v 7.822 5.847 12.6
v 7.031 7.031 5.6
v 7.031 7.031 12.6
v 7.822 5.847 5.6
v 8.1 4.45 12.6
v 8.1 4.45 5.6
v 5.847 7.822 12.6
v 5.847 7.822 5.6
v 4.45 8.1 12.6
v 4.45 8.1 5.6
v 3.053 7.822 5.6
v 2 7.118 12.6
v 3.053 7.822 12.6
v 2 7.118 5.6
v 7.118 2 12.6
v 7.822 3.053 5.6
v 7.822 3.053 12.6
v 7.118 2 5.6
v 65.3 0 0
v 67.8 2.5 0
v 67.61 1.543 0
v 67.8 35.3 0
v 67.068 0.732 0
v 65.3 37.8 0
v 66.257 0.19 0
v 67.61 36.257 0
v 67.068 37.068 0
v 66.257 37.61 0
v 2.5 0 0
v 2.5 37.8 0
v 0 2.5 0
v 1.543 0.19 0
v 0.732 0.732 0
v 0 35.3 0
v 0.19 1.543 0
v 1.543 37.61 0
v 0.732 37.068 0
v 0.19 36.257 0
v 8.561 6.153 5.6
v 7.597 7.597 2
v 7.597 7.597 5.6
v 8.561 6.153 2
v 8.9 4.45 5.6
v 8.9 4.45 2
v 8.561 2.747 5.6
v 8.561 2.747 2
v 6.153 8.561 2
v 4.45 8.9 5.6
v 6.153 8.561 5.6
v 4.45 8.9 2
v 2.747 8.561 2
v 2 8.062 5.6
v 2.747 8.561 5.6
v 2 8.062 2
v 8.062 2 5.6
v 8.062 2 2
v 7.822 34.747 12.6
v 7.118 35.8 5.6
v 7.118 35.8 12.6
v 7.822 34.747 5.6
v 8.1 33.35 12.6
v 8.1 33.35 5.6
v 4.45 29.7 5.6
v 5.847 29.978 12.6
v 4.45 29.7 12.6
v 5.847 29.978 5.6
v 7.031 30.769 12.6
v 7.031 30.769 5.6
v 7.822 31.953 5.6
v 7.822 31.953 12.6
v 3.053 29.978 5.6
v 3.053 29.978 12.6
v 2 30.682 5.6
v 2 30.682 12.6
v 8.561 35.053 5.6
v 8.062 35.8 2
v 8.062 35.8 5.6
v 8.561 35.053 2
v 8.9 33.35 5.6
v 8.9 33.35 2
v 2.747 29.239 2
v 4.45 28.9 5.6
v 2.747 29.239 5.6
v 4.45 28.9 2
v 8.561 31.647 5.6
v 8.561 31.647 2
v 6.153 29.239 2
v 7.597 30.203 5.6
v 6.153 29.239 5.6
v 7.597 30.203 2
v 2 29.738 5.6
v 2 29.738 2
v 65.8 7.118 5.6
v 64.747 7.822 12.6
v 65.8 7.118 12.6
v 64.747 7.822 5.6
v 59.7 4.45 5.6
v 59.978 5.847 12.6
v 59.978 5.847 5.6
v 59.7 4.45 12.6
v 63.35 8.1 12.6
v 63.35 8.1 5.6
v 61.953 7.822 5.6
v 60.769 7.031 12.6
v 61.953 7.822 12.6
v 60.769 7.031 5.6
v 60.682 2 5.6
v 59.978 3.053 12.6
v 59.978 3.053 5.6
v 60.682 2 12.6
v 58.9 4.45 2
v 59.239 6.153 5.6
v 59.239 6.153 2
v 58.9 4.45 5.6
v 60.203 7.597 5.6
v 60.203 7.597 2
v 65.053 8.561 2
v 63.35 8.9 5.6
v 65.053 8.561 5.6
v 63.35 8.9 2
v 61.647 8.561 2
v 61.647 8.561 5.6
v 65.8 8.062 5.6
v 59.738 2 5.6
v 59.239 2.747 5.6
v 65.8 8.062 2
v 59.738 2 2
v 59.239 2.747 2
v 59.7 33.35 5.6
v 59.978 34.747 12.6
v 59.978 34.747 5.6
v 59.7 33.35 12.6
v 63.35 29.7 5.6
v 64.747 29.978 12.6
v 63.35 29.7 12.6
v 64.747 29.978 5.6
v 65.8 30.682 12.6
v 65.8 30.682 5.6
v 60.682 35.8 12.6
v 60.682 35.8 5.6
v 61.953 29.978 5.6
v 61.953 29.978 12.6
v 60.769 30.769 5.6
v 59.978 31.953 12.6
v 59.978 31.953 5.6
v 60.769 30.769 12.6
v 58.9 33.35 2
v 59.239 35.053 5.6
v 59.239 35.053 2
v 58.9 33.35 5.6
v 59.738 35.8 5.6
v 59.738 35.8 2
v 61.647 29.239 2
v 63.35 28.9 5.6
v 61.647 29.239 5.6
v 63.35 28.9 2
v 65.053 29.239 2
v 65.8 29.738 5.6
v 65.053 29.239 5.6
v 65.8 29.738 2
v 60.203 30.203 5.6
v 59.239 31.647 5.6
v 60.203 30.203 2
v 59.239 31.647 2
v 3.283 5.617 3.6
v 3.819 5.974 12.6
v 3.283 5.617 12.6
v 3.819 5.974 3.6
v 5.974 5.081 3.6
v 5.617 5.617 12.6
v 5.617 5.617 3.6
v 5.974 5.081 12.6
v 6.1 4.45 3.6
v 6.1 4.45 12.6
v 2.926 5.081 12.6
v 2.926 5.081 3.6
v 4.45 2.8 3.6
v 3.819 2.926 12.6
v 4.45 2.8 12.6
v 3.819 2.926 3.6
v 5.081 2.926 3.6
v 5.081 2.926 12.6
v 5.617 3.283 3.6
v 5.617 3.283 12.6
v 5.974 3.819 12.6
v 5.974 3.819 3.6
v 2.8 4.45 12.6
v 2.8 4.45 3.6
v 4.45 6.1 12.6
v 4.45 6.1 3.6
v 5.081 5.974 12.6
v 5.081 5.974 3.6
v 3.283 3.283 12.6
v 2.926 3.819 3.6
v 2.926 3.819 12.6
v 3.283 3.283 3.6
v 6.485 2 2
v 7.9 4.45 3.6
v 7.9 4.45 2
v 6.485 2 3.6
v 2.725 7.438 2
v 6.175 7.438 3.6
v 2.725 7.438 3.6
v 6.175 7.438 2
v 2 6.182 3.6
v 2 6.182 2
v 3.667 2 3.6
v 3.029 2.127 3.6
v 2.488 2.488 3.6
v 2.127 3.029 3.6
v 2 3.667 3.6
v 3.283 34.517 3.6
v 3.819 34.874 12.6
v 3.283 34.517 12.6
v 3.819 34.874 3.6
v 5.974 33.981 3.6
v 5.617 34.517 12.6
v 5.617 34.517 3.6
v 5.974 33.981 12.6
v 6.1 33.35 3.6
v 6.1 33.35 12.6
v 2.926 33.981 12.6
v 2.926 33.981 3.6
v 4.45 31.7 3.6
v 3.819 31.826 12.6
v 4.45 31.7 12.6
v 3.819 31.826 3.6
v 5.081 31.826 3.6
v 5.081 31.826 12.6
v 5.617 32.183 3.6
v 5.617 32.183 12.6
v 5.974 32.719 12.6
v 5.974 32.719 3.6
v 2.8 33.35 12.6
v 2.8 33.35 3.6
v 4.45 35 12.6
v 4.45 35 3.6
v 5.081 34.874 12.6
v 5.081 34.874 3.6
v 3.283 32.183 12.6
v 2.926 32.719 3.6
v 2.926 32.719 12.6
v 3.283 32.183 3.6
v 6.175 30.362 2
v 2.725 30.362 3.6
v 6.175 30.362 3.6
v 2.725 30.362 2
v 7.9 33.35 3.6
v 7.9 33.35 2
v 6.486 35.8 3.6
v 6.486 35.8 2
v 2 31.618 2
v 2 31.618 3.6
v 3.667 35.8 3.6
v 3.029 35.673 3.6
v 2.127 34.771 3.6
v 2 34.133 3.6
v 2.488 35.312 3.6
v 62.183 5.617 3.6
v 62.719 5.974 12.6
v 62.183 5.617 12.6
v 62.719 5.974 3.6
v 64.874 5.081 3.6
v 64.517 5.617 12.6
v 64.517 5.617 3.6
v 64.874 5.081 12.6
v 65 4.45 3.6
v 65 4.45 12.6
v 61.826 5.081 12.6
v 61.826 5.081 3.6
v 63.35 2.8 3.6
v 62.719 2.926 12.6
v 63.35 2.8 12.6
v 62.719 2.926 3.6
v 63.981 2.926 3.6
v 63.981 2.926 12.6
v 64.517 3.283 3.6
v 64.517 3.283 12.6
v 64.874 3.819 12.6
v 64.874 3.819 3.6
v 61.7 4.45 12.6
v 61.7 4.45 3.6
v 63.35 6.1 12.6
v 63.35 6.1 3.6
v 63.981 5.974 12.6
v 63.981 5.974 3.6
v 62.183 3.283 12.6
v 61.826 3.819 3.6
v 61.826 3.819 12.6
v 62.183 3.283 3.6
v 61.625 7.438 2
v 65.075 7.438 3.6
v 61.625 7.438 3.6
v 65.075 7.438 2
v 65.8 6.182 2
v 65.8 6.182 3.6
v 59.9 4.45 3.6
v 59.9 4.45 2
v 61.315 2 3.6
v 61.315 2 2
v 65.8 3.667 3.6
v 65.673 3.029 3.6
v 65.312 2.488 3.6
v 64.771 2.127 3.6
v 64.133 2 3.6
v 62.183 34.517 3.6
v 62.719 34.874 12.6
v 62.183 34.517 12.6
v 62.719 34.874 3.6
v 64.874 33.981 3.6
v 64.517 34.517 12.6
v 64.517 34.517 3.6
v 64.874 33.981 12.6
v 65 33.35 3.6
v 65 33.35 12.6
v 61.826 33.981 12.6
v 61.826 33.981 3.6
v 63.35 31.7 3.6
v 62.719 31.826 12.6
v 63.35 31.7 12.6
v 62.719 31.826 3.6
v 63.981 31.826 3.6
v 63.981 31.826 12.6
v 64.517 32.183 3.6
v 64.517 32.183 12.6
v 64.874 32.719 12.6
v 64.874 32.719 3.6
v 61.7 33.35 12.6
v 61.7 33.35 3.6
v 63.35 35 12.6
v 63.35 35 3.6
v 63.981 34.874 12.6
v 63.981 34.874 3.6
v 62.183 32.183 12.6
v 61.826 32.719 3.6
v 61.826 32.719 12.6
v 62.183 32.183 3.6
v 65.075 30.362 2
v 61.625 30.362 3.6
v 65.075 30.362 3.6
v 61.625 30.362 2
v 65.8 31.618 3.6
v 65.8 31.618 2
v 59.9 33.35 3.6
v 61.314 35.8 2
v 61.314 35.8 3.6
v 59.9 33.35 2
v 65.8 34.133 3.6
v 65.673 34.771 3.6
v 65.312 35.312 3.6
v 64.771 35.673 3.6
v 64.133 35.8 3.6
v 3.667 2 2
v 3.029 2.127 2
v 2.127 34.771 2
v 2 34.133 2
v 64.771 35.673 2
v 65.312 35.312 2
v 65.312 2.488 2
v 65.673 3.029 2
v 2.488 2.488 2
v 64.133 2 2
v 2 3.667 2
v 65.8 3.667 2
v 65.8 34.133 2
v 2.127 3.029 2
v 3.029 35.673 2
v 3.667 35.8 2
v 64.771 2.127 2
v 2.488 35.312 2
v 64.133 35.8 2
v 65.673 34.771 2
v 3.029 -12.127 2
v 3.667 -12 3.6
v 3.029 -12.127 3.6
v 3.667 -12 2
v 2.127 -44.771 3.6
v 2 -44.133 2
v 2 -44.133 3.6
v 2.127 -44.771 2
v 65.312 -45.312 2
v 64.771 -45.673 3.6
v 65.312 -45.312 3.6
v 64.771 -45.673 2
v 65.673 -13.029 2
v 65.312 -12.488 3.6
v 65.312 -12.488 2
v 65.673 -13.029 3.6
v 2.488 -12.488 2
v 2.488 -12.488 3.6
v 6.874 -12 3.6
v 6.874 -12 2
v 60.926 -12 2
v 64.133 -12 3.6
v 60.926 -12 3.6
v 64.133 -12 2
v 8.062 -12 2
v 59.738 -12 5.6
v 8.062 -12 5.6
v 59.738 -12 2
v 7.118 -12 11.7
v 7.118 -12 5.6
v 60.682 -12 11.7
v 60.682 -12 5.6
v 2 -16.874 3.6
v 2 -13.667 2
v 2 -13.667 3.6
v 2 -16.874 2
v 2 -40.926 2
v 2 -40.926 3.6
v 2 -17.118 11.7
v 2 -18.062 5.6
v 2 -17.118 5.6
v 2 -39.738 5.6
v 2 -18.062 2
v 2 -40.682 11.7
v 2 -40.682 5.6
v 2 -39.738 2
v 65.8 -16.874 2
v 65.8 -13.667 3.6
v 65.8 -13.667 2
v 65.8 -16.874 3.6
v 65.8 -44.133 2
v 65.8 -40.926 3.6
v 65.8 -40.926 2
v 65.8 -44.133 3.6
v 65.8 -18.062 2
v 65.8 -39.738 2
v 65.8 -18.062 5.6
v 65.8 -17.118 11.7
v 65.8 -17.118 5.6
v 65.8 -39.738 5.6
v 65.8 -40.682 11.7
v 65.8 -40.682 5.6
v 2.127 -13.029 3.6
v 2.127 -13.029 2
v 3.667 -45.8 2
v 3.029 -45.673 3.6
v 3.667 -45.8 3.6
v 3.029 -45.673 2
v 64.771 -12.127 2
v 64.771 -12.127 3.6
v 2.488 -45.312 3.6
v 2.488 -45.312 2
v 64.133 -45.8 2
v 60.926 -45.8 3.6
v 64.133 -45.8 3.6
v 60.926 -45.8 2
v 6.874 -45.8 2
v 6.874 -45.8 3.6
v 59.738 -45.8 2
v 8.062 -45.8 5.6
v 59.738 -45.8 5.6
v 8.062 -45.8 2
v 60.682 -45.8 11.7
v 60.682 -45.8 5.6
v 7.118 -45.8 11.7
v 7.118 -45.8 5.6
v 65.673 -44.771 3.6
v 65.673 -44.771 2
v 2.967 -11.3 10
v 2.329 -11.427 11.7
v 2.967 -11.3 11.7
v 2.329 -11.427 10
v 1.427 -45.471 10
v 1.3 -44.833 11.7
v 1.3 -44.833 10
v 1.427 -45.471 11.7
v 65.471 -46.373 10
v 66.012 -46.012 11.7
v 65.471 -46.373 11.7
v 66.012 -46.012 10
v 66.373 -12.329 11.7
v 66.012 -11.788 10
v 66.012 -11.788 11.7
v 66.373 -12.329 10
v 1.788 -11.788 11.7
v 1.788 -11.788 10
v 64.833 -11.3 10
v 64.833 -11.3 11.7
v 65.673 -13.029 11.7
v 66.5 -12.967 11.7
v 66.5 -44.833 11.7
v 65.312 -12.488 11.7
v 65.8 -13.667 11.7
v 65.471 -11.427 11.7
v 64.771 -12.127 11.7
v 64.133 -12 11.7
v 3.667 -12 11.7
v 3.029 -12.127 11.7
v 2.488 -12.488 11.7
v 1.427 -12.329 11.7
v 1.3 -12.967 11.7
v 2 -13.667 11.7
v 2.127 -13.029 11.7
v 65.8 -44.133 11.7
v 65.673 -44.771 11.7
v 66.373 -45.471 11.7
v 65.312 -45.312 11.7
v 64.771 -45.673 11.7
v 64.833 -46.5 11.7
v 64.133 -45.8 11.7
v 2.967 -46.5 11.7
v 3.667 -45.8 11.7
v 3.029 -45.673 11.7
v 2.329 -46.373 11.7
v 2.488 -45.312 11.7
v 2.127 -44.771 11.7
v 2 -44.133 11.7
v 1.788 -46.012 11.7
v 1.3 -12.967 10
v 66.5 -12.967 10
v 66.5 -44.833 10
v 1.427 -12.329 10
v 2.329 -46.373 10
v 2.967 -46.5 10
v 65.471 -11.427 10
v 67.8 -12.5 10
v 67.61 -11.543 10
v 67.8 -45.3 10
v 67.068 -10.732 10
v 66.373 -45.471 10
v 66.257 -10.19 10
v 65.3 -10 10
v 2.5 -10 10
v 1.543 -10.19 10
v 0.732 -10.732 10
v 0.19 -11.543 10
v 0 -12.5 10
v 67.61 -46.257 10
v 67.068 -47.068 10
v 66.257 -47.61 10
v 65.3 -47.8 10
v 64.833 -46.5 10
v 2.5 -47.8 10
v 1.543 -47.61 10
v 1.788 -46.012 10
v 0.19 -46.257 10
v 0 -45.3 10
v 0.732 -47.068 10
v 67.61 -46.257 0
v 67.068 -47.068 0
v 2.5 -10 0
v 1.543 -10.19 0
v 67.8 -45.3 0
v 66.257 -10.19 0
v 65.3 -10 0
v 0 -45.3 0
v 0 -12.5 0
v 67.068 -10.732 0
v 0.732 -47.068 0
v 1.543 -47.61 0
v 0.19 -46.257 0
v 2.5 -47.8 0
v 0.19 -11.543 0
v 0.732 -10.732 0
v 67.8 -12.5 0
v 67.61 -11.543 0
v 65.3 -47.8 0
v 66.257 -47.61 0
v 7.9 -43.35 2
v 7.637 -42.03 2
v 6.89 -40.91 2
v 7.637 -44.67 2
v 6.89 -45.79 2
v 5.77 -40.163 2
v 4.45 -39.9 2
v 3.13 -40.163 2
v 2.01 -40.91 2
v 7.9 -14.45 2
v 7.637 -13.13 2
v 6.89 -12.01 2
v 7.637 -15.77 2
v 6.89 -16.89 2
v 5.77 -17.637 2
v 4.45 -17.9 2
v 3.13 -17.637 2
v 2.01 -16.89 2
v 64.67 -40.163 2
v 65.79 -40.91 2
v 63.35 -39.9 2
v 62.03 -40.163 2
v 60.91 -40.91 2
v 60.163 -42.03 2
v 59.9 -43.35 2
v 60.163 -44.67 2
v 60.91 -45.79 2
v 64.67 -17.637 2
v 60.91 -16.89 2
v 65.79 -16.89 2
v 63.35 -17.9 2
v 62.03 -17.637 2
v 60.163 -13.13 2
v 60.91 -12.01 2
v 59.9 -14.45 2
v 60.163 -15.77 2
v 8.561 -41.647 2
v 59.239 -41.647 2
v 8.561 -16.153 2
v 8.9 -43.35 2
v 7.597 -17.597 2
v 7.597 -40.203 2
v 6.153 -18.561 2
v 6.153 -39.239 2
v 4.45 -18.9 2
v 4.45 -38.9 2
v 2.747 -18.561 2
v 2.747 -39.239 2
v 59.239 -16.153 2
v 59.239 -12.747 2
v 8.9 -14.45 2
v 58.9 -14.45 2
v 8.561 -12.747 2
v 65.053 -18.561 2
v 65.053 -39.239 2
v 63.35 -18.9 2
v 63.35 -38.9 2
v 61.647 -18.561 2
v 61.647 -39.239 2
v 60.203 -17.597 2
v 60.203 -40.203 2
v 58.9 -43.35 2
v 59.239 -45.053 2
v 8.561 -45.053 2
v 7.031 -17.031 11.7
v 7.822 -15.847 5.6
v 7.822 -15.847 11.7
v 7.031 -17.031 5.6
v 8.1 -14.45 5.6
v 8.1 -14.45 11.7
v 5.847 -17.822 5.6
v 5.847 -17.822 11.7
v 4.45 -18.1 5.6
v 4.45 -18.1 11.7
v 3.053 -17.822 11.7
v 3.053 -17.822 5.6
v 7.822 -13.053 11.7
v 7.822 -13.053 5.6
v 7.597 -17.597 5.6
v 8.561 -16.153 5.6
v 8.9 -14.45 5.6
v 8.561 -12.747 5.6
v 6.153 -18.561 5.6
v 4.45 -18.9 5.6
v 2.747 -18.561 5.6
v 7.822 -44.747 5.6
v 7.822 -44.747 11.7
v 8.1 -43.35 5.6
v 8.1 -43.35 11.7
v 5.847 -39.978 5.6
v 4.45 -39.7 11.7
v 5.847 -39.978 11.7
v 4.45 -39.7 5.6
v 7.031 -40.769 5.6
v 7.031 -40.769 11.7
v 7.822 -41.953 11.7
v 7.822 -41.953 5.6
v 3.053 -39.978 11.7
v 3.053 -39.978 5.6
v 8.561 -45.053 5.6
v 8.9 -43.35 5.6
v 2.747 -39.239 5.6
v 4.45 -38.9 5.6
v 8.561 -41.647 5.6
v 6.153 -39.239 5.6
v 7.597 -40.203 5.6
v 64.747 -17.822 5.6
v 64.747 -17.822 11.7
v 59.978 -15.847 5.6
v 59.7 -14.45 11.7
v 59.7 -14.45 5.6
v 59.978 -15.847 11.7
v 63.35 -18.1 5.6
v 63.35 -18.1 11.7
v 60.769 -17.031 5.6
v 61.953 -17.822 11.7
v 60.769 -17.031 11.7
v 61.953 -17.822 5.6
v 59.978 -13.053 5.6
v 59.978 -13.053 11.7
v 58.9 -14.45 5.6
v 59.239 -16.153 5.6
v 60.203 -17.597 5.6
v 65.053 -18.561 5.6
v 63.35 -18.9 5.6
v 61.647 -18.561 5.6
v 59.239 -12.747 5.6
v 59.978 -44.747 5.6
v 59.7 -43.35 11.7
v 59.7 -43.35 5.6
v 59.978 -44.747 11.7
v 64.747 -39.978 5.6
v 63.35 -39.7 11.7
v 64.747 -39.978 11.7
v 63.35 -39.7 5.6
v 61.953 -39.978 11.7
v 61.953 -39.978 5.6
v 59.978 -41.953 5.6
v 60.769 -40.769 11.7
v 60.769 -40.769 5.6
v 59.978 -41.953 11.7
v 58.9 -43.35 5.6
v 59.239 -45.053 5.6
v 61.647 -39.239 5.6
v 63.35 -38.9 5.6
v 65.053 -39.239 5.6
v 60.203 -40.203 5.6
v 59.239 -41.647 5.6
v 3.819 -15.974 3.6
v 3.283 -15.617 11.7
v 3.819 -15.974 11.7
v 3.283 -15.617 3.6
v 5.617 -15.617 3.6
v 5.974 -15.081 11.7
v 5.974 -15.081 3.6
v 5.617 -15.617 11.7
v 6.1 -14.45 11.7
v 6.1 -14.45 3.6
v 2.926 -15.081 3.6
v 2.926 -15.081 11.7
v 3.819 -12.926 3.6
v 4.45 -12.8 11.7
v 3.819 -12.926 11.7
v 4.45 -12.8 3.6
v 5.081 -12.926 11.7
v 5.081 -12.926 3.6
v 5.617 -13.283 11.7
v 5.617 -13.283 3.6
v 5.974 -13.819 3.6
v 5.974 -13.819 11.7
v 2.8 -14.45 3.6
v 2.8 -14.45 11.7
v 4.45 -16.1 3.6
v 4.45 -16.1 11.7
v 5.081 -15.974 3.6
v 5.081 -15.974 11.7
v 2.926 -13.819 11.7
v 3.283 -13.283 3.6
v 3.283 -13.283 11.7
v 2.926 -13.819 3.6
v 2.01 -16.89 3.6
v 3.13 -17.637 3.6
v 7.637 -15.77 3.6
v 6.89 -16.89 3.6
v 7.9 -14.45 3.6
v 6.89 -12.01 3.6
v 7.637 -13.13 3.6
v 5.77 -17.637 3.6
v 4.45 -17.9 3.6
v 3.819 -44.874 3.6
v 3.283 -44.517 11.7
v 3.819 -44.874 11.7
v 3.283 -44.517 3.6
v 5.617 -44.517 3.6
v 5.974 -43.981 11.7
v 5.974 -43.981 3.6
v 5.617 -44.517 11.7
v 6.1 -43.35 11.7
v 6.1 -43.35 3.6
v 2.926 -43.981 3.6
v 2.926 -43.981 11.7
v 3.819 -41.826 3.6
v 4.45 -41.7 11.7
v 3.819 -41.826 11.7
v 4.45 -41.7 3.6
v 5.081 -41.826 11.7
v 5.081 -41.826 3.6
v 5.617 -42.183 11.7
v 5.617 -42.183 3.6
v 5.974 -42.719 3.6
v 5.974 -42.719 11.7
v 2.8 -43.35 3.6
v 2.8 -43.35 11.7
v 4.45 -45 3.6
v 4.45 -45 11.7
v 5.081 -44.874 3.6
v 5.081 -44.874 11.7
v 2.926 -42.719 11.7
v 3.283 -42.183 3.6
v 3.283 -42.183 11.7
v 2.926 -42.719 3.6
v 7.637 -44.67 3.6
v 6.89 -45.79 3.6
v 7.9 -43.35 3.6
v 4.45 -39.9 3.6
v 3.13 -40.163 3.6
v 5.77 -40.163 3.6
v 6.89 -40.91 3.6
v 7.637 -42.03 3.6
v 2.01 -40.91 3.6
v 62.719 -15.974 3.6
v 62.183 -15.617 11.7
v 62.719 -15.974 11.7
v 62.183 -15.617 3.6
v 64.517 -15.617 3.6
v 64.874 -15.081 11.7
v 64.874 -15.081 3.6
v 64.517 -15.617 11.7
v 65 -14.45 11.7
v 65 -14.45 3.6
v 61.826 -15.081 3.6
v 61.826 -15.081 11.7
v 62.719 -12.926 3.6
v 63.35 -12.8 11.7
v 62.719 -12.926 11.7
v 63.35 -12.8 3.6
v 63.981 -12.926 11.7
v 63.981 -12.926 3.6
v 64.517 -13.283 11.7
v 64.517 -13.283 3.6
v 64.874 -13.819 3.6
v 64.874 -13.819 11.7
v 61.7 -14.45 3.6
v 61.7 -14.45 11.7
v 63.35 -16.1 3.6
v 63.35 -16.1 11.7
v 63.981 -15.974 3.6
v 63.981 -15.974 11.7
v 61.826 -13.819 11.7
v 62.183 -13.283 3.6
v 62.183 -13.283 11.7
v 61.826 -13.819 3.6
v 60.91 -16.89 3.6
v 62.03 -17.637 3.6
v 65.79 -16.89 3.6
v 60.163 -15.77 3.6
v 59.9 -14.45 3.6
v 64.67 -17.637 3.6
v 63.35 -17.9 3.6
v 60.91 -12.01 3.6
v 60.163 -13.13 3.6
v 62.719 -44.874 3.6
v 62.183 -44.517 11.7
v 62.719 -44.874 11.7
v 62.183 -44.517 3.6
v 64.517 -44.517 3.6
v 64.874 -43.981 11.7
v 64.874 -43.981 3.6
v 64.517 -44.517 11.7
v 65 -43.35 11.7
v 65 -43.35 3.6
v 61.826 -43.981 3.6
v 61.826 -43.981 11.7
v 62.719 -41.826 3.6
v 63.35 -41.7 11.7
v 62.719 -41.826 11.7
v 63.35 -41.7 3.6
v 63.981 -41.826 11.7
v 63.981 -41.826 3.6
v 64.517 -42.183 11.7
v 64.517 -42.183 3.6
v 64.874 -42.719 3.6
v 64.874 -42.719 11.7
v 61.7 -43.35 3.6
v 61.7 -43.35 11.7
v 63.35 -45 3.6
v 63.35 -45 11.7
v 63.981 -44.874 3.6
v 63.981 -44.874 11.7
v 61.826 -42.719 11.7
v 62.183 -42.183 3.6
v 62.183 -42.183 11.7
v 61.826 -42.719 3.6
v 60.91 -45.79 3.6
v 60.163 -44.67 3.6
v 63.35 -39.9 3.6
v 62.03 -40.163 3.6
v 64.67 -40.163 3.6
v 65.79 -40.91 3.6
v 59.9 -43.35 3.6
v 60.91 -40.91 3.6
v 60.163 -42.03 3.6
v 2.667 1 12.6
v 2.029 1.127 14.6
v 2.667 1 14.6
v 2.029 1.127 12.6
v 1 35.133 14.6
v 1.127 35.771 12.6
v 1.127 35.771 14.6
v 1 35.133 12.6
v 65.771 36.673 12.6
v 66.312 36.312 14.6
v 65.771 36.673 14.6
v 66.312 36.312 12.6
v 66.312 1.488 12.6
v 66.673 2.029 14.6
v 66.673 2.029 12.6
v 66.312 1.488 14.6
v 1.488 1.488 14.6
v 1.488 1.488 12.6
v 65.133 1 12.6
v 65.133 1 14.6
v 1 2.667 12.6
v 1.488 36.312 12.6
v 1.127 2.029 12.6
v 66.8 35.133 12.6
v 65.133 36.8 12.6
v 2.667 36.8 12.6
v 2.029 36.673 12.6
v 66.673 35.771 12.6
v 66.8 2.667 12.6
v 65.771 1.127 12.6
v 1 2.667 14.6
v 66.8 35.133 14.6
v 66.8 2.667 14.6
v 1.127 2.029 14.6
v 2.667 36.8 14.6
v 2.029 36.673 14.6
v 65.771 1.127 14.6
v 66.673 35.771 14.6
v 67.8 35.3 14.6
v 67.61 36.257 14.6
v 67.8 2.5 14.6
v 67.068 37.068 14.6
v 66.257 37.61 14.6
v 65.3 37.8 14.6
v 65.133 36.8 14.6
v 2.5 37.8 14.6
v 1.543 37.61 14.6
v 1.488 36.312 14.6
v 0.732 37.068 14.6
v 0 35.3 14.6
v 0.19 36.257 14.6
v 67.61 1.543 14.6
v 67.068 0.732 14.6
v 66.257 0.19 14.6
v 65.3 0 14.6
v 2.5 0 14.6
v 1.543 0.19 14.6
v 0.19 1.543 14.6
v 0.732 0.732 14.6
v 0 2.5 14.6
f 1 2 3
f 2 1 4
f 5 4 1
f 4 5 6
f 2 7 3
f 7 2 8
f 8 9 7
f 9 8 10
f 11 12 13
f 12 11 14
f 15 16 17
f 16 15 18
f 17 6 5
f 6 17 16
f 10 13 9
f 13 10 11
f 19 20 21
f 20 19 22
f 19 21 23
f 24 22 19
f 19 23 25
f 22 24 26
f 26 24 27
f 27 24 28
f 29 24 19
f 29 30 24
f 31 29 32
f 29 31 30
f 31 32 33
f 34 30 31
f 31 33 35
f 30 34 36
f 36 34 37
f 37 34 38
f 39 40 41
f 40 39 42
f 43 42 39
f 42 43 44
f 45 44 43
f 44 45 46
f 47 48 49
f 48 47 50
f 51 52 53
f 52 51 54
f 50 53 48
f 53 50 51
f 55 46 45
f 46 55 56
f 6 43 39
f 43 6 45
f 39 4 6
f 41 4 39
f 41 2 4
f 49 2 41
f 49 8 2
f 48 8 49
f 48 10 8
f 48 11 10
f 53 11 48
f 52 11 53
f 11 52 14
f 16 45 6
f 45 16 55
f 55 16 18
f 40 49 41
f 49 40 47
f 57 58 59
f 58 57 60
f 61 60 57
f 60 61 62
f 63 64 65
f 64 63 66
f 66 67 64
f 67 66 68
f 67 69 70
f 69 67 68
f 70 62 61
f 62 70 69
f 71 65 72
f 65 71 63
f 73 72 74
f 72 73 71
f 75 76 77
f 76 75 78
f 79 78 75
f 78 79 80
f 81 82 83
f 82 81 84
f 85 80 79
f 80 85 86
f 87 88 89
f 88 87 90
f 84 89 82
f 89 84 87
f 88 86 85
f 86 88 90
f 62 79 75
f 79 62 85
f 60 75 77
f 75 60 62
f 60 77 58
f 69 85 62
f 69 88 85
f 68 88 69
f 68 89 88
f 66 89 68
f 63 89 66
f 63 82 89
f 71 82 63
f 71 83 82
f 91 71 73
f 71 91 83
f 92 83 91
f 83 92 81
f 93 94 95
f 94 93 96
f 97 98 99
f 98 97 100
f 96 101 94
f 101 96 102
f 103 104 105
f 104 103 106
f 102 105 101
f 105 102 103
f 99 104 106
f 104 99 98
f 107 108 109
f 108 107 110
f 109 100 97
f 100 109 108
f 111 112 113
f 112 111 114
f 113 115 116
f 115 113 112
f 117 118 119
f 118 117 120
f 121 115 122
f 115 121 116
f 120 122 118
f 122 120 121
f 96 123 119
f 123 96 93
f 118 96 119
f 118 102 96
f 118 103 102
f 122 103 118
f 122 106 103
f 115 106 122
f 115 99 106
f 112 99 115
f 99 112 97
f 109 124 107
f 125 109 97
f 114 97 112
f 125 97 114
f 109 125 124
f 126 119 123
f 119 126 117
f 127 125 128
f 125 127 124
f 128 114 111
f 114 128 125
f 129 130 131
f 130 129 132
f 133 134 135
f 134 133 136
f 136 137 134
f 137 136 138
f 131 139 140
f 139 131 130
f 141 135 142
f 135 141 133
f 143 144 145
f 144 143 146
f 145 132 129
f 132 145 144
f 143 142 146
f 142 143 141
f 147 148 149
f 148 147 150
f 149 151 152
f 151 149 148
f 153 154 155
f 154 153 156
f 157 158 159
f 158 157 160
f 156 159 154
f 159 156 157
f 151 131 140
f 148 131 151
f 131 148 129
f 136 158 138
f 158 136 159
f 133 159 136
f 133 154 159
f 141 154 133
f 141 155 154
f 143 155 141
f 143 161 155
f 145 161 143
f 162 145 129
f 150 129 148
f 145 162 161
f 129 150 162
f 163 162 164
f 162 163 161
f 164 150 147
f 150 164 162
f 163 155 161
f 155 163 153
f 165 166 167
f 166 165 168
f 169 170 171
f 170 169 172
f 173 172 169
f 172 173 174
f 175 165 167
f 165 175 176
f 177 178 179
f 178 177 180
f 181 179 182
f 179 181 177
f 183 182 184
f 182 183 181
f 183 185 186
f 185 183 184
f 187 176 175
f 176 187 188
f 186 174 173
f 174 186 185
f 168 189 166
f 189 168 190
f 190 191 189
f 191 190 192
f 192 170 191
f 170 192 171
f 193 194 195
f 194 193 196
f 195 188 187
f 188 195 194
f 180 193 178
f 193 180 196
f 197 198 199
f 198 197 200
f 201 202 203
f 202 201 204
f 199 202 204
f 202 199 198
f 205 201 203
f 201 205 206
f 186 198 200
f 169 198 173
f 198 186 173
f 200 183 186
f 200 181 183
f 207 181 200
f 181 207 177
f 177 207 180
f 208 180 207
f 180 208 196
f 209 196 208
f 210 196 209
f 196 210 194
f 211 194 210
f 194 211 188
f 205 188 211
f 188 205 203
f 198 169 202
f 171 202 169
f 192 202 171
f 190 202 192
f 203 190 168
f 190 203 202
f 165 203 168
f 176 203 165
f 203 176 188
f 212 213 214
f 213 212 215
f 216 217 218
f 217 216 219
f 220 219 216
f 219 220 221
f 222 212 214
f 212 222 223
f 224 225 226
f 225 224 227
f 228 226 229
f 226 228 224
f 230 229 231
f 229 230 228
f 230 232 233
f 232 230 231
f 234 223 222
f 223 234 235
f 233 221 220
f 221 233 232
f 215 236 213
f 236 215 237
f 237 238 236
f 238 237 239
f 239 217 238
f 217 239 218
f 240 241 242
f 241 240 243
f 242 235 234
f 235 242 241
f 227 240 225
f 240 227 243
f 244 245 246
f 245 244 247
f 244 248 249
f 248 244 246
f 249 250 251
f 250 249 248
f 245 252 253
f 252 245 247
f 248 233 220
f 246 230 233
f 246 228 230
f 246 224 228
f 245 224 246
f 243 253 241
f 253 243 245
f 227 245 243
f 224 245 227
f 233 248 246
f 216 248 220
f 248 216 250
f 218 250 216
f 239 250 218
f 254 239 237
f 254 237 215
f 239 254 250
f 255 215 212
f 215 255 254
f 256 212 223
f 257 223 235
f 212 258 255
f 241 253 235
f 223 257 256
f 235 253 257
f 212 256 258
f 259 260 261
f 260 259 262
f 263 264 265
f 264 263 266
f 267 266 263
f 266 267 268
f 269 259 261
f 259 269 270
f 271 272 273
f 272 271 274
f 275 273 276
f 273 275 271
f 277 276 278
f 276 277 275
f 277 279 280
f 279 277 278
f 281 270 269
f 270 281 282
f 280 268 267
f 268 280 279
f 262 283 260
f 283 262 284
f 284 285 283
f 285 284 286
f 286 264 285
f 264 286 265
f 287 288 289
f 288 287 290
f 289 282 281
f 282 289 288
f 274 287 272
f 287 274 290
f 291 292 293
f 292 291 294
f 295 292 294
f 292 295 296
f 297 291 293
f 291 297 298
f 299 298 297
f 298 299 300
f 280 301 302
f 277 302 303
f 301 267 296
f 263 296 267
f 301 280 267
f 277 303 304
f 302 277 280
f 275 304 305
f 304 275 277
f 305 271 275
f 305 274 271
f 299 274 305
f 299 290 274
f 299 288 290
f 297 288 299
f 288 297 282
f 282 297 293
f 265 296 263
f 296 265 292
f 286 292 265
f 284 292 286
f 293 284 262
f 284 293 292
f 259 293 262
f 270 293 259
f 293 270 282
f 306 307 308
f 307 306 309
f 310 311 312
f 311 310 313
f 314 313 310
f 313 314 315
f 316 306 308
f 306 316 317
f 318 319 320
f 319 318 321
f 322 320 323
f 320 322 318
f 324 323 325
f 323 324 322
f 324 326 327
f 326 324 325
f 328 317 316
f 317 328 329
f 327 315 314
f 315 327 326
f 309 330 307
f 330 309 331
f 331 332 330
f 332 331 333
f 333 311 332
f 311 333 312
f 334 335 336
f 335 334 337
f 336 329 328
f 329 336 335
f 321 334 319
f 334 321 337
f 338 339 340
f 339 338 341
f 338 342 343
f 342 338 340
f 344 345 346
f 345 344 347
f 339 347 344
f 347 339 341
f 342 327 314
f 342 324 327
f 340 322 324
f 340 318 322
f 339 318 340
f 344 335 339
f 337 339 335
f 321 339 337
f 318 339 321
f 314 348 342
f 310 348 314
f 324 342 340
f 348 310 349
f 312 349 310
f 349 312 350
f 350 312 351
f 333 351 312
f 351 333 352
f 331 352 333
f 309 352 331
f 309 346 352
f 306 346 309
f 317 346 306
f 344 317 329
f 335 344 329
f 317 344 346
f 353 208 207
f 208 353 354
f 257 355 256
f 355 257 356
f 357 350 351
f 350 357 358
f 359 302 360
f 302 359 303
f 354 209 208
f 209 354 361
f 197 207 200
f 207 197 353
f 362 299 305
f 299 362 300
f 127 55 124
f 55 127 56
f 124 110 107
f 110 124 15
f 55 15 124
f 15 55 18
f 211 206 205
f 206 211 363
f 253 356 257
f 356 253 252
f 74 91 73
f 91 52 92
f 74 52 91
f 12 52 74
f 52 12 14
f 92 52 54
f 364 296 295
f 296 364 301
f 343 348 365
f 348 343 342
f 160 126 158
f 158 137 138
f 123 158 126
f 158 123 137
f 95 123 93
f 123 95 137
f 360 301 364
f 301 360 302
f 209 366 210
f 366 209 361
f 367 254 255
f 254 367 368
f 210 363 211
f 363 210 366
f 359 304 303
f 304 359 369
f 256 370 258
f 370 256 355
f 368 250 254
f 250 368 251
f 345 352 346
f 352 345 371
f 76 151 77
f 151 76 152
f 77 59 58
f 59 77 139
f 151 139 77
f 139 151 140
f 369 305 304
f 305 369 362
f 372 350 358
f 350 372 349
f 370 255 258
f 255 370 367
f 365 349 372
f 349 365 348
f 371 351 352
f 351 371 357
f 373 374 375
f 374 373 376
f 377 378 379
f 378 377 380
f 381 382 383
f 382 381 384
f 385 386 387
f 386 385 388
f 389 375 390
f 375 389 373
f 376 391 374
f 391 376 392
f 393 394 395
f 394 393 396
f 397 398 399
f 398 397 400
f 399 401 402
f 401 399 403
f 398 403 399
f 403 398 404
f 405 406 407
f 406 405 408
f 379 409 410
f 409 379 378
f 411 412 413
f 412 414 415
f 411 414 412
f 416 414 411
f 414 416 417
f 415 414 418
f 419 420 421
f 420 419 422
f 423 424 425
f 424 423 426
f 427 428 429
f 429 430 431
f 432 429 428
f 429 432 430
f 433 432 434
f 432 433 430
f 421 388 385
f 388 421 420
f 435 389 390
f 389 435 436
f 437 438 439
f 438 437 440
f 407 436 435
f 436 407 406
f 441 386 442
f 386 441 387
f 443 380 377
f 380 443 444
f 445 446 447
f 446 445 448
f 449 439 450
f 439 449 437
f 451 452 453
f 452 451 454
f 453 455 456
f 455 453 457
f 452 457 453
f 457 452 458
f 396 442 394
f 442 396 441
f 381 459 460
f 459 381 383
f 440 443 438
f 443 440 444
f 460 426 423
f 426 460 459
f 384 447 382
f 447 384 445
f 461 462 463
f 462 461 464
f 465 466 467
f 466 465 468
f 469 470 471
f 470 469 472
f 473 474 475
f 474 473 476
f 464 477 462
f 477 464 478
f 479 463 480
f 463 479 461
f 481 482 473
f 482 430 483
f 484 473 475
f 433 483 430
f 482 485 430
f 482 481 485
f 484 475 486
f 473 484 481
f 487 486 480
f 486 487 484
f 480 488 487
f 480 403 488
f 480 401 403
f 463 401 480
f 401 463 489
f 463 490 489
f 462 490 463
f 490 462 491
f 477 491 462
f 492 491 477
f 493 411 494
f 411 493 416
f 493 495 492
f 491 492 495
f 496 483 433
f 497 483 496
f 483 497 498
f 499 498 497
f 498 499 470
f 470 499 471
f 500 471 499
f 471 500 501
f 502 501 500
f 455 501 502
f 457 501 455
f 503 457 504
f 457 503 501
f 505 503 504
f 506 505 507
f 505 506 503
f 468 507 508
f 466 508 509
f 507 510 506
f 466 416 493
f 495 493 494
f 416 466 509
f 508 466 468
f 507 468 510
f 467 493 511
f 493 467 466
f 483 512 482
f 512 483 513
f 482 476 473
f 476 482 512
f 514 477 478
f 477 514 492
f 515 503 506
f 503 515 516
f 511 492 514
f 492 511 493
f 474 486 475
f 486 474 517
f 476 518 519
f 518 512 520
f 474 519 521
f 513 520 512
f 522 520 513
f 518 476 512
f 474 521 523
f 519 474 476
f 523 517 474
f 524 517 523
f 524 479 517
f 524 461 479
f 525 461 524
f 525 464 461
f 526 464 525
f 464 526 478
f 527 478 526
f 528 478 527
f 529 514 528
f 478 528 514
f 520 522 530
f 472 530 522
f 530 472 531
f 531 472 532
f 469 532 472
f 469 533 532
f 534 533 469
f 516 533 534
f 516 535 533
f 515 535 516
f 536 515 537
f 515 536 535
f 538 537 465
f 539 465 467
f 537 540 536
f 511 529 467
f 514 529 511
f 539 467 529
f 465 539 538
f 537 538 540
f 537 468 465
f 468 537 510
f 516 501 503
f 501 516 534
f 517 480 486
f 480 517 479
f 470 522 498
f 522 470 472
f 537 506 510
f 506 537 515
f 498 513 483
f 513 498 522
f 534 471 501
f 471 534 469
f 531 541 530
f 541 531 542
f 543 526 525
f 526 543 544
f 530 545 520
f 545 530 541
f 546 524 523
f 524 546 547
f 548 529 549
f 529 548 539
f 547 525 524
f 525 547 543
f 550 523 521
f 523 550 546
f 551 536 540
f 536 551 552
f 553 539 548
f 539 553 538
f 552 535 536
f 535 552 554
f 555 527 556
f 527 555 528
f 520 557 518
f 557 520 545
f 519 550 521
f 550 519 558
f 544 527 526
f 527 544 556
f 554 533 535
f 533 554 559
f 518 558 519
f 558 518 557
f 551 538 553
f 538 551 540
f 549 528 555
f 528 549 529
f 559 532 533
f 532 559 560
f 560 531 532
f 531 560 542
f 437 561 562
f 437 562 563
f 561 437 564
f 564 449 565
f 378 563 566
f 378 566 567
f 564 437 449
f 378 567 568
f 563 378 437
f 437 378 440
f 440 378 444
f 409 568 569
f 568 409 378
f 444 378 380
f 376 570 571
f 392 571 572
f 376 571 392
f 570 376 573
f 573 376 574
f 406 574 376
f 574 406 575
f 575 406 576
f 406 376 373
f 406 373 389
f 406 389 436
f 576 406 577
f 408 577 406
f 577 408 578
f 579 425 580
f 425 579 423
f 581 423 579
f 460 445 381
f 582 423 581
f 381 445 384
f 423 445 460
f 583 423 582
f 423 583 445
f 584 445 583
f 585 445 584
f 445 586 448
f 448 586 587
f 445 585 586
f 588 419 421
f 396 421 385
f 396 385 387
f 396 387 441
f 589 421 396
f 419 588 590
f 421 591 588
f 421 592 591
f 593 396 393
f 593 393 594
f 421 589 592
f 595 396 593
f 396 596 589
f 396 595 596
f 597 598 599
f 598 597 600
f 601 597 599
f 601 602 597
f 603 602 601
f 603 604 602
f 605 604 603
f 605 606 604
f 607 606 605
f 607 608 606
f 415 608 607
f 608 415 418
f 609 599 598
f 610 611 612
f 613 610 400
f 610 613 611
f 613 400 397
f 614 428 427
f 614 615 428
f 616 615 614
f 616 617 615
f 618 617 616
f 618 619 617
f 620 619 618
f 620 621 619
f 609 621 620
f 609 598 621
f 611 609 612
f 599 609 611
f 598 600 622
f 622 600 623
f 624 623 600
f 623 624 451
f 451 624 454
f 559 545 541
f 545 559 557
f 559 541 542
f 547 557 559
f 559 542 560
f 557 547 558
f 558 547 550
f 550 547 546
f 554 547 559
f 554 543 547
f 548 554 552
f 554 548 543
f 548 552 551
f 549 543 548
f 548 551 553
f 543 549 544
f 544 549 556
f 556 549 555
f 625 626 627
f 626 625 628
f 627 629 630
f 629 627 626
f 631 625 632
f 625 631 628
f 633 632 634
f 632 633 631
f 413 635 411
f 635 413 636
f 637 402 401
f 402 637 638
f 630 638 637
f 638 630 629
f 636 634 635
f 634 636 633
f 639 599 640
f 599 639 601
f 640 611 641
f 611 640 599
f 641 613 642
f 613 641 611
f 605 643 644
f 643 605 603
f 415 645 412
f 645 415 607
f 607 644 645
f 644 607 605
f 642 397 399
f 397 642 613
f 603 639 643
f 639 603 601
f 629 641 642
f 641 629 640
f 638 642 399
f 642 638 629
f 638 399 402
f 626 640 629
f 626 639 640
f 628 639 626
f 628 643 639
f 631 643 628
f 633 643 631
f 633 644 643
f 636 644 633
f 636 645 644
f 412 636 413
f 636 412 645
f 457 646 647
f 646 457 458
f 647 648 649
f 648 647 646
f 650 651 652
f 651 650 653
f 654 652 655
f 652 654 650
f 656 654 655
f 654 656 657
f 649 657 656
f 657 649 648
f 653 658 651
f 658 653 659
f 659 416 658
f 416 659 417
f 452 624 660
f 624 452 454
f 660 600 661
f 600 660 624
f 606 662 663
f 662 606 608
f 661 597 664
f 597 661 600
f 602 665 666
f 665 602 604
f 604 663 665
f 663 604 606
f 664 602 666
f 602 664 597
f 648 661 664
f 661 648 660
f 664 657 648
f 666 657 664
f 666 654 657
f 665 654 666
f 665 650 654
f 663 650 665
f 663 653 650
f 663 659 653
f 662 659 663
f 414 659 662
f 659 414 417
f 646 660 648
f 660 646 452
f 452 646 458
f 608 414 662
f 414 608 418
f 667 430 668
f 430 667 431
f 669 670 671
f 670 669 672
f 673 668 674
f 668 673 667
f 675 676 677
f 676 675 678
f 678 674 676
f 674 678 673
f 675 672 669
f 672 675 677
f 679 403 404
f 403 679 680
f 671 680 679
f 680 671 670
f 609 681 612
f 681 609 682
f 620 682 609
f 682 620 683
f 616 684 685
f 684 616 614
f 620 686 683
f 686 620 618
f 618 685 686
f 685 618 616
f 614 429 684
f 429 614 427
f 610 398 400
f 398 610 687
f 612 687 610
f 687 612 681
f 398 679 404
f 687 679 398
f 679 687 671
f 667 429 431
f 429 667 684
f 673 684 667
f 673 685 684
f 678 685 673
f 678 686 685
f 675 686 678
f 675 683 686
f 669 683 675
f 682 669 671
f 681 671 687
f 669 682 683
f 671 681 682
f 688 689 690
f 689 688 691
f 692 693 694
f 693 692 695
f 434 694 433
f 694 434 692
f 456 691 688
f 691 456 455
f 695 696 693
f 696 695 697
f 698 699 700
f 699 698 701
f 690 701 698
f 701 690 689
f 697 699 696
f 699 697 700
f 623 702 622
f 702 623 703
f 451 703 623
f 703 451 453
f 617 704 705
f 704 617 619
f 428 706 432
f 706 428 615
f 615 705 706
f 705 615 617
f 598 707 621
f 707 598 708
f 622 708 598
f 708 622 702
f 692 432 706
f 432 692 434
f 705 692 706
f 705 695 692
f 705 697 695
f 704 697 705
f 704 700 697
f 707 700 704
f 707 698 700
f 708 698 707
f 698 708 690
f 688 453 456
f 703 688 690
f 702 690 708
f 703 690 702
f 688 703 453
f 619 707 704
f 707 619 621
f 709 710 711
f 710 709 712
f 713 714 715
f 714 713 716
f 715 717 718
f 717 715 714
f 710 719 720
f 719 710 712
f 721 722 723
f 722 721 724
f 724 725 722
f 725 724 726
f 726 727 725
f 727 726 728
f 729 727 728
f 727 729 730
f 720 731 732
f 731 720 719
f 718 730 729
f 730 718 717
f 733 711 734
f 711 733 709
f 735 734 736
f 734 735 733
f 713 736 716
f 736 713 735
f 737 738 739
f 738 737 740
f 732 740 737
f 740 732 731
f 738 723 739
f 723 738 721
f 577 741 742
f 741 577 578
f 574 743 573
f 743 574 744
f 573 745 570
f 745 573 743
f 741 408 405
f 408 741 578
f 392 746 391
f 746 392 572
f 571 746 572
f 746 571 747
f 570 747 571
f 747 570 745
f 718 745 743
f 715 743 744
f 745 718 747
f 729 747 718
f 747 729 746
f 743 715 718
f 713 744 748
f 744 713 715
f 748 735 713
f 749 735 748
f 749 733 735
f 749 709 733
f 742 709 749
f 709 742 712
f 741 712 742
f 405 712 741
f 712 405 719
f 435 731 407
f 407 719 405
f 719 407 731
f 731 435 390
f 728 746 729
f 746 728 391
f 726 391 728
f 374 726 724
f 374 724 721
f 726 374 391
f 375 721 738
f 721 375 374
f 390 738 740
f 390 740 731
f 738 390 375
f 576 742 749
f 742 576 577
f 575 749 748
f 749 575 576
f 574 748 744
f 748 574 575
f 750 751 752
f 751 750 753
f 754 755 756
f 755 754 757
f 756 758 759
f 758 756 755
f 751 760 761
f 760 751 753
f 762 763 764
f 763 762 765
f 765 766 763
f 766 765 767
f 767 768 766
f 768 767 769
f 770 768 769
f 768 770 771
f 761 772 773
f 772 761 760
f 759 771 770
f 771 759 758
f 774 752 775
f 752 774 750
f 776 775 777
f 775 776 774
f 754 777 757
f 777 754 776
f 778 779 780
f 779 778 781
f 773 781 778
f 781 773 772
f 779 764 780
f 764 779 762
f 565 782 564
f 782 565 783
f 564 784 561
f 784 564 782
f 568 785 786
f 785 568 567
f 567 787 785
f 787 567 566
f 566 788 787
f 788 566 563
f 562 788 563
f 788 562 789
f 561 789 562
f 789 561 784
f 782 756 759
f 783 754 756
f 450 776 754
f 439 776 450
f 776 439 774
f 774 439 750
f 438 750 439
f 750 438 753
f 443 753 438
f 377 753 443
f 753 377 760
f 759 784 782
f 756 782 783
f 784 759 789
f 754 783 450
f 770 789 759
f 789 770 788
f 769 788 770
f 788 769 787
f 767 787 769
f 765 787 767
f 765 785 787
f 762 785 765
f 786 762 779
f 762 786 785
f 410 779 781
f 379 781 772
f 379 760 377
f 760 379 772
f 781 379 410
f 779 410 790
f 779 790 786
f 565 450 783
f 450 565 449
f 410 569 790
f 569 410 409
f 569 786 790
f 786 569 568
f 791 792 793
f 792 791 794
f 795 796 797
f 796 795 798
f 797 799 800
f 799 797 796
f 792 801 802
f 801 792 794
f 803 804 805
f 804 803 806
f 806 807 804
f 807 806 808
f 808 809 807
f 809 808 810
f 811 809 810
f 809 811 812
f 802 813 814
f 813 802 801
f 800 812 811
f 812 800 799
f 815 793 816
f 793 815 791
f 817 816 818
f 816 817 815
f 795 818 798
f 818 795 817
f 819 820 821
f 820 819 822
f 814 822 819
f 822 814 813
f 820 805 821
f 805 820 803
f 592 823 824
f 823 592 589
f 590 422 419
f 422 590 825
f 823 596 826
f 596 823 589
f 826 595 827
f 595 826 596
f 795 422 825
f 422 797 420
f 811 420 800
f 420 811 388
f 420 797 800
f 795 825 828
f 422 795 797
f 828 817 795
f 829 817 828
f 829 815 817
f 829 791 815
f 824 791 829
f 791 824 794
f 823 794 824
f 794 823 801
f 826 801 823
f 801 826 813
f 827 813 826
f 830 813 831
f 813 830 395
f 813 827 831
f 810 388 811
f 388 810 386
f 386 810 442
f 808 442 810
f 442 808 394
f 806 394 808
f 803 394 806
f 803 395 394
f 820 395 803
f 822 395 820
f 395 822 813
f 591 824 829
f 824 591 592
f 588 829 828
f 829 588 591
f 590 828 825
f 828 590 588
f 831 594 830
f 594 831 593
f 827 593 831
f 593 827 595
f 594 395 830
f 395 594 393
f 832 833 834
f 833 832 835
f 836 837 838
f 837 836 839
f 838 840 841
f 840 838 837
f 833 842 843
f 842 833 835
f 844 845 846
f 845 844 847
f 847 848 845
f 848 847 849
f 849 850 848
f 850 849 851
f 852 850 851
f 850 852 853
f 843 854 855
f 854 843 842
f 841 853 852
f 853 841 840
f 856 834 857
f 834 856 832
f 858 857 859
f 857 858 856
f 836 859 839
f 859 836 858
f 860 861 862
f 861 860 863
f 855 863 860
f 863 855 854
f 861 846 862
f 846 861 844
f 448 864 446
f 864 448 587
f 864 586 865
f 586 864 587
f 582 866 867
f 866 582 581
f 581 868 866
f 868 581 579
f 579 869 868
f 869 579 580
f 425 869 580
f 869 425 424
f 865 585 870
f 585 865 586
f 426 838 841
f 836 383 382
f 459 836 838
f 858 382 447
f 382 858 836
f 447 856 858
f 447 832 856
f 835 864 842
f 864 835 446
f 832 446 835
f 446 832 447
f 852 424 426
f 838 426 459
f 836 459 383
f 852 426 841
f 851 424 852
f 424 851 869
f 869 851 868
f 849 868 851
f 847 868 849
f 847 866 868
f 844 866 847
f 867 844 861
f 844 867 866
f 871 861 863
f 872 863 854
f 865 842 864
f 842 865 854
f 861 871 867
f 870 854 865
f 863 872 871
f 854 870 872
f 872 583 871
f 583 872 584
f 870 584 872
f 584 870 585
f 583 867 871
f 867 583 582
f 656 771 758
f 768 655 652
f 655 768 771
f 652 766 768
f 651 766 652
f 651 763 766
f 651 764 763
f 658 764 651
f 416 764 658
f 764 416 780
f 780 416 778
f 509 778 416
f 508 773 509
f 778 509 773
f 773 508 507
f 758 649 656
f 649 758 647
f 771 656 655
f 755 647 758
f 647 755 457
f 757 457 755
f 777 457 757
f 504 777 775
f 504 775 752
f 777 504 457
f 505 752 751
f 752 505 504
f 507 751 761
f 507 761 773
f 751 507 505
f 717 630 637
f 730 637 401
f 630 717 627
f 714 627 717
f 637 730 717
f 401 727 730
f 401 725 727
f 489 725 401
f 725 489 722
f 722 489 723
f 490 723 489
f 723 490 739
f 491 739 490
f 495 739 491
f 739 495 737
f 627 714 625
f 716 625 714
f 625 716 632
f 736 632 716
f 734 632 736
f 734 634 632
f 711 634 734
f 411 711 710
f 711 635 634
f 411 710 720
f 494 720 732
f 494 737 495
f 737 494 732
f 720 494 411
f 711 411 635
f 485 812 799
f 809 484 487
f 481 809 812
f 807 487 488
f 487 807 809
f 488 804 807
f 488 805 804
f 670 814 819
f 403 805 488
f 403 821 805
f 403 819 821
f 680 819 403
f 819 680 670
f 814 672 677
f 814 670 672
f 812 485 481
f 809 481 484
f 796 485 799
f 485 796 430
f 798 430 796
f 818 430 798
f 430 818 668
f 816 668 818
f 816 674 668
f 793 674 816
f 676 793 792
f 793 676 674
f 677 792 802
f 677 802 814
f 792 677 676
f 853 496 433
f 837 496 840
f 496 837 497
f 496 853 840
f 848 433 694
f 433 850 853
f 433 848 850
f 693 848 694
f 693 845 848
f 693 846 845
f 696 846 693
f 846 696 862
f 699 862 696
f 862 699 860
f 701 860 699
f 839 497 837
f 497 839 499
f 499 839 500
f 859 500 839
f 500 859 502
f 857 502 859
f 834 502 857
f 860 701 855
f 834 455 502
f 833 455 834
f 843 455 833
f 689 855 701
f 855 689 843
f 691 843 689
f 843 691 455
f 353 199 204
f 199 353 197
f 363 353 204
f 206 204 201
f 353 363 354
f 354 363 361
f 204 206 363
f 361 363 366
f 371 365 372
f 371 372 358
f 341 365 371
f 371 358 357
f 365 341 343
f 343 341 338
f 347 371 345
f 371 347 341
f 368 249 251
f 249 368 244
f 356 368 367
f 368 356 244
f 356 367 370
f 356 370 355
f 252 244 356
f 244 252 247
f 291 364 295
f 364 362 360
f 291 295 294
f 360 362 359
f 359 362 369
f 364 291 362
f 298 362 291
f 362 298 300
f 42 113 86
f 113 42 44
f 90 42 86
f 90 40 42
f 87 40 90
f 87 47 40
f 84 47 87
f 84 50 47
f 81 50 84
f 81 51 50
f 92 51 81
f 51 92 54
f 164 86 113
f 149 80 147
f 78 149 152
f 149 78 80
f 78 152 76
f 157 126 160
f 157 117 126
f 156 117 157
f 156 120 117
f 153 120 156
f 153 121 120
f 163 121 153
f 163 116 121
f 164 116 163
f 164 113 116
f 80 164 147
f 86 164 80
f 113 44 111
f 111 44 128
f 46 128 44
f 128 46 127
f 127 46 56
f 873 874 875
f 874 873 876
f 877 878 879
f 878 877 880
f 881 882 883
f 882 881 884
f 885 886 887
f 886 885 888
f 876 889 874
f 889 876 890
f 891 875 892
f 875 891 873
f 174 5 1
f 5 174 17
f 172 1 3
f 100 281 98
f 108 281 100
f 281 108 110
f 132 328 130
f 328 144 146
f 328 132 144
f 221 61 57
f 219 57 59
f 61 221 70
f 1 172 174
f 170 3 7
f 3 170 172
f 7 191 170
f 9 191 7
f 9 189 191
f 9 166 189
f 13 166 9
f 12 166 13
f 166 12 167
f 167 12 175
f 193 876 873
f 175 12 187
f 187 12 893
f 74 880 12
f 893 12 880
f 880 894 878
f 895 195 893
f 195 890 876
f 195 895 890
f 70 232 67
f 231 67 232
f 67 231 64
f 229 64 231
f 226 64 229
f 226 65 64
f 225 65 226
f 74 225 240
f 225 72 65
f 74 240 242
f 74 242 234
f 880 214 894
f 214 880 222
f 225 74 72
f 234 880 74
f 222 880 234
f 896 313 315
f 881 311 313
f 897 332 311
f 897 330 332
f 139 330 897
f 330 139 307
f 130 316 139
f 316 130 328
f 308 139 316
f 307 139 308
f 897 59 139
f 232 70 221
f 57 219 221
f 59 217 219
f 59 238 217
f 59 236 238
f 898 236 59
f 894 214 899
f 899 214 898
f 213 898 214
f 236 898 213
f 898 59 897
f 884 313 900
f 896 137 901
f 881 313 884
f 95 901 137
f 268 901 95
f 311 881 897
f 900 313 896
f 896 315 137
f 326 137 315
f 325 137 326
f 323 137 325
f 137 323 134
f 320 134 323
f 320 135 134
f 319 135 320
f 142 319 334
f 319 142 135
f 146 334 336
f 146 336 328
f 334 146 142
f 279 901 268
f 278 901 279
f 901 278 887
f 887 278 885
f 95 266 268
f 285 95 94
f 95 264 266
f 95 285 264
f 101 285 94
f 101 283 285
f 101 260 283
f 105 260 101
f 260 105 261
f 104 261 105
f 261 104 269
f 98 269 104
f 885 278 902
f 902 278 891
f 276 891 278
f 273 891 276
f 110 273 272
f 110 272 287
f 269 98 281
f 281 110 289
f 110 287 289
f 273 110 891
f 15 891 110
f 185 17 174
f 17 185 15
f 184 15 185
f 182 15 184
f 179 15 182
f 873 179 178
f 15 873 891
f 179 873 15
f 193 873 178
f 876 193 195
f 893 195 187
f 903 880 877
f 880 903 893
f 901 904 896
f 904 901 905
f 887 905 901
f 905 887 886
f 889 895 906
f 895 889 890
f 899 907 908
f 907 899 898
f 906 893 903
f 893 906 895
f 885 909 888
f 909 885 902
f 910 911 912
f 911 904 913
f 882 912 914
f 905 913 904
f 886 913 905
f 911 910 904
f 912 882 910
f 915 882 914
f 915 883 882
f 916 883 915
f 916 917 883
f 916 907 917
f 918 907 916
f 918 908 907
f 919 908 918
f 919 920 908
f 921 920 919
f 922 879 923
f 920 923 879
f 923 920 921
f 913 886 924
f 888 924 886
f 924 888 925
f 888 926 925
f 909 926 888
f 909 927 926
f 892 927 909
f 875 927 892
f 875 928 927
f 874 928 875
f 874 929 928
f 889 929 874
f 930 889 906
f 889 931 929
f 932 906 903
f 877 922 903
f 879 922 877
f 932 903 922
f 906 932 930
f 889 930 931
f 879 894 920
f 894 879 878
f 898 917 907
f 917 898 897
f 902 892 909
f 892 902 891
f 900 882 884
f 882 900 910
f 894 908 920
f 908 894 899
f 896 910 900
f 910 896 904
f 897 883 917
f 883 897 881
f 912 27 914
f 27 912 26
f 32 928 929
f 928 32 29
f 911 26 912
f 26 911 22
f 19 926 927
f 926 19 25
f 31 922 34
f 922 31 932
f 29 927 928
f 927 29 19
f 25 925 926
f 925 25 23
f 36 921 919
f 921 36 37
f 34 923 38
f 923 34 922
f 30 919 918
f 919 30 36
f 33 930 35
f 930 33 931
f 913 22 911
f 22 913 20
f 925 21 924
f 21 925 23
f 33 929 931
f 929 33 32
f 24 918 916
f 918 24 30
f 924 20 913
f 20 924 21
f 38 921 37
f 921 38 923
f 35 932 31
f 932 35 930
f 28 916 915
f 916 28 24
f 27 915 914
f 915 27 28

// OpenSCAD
// file: cube_round.scad
module cube_round(dim,mki=5,plane="xy"){
    if(mki<=0)
    {
        cube(dim);
    }
    else
    {
        if(plane=="xy")
        {
            translate([mki/2,mki/2,0])
            {
                linear_extrude(dim[2])
                {
                    minkowski()
                    {
                        square([dim[0]-mki,dim[1]-mki]);
                        circle(d=mki);
                    }
                }
            }
        }
        if(plane=="yz")
        {
            translate([0,mki/2,dim[2]-mki/2])
            {
                rotate([0,90,0])
                {
                    linear_extrude(dim[0])
                    {
                        minkowski()
                        {
                            square([dim[2]-mki,dim[1]-mki]);
                            circle(d=mki);
                        }
                    }
                }
            }
        }
        if(plane=="xz")
        {
            translate([mki/2,dim[1],mki/2])
            {
                rotate([90,0,0])
                {
                    linear_extrude(dim[1])
                    {
                        minkowski()
                        {
                            square([dim[0]-mki,dim[2]-mki]);
                            circle(d=mki);
                        }
                    }
                }
            }
        }
    }
}

cube_round([10,20,30],4,"xy");
// main file
$fn=16;
use <cube_round.scad>;

case(render="all");

module case(render="all",
            dim_inside=[50,20,20],
            dia_screws=3.3,
            wall=2,
            height_top=10,
            gap=0.3,
            mki=5)
{
    dia_screw_head=2*dia_screws+gap;
    height_screw_head=dia_screws+gap;
    off_screw=dia_screw_head/2+wall/2;
    
    off_inside=dia_screw_head+wall;
    mki_inside=2/3*mki;
    
    dim_outside=dim_inside+[2*off_inside,
                            2*off_inside,
                            2*(wall+gap)];
    
    height_bottom=dim_outside[2]-height_top;
    
    if(render=="top" || render=="all")
    {
        translate([0,-10,dim_outside[2]])
        {
            rotate([180,0,0])
            {
                // cut away lower part from case
                difference()
                {
                    cube_round(dim_outside,mki=mki);
                    cutout_top();
                }
                difference()
                {
                    addon_screws();
                    cube([dim_outside[0],
                    dim_outside[1],
                    height_bottom-wall+gap]);
                }
            }
        }
    }
    
    if(render=="bottom" || render=="all")
    {
        // cut away upper part from case
        difference()
        {
            cube_round(dim_outside,mki=mki);
            cutout_bottom();
        }
        // add screw hull
        difference()
        {
            addon_screws();
            translate([0,0,height_bottom-wall])
            {
                cube([dim_outside[0],
                      dim_outside[1],
                      height_top+wall]);
            }
        }
    }
    
    module cutout_top()
    {
        translate([wall,wall,wall])
        {
            cube_round([dim_outside[0]-2*wall,
                        dim_outside[1]-2*wall,
                        dim_outside[2]-2*wall],mki_inside);
        }
        difference()
        {
            cube_round(dim_outside,mki=mki);
            cutout_bottom(gap=-gap);
        }
    }
    
    module cutout_bottom(gap=0)
    {
        translate([wall,wall,wall])
        {
            cube_round([dim_outside[0]-2*wall,
                  dim_outside[1]-2*wall,
                  dim_outside[2]-2*wall],mki_inside);
        }
        translate([wall/2-gap,wall/2-gap,height_bottom-wall-gap])
        {
            cube_round([dim_outside[0]-wall+2*gap,
                        dim_outside[1]-wall+2*gap,
                        wall+gap],mki_inside);
        }
        translate([0,0,height_bottom])
        {
            cube_round([dim_outside[0],
                        dim_outside[1],
                        height_top]);
        }
    }
    
    module cutout_screws()
    {
        place_screws(dim_x=dim_outside[0],
                     dim_y=dim_outside[1],
                     off_x=off_screw,
                     off_y=off_screw)
        {
            cylinder(h=dim_outside[2],d=dia_screws);
            cylinder(h=height_screw_head,d=dia_screw_head,$fn=6);
            translate([0,0,dim_outside[2]-height_screw_head])
            {
                cylinder(h=height_screw_head,d=dia_screw_head);
            }
        }
        
    }

    module addon_screws(gap=0)
    {
        intersection()
        {
            difference()
            {
                place_screws(dim_x=dim_outside[0],
                             dim_y=dim_outside[1],
                             off_x=off_screw,
                             off_y=off_screw)
                {
                    cylinder(h=dim_outside[2],d=dia_screws+2*wall);
                    cylinder(h=height_screw_head+wall,d=dia_screw_head+wall);
                    translate([0,0,dim_outside[2]-(height_screw_head+wall)])
                    {
                        cylinder(h=height_screw_head+wall,d=dia_screw_head+wall);
                    }
                }
                cutout_screws();
            }
            translate([wall-gap,wall-gap,0])
            {
                #cube_round([dim_outside[0]-2*wall+2*gap,
                            dim_outside[1]-2*wall+2*gap,
                            dim_outside[2]],mki_inside);
            }
        }
    }
}

module place_screws(dim_x,dim_y,off_x,off_y)
{
    loc=[[off_x,off_y],
         [off_x,dim_y-off_y],
         [dim_x-off_x,off_y],
         [dim_x-off_x,dim_y-off_y]];
    
    for(i=loc)
    {
        translate(i)
        {
            children();
        }
    }
}
